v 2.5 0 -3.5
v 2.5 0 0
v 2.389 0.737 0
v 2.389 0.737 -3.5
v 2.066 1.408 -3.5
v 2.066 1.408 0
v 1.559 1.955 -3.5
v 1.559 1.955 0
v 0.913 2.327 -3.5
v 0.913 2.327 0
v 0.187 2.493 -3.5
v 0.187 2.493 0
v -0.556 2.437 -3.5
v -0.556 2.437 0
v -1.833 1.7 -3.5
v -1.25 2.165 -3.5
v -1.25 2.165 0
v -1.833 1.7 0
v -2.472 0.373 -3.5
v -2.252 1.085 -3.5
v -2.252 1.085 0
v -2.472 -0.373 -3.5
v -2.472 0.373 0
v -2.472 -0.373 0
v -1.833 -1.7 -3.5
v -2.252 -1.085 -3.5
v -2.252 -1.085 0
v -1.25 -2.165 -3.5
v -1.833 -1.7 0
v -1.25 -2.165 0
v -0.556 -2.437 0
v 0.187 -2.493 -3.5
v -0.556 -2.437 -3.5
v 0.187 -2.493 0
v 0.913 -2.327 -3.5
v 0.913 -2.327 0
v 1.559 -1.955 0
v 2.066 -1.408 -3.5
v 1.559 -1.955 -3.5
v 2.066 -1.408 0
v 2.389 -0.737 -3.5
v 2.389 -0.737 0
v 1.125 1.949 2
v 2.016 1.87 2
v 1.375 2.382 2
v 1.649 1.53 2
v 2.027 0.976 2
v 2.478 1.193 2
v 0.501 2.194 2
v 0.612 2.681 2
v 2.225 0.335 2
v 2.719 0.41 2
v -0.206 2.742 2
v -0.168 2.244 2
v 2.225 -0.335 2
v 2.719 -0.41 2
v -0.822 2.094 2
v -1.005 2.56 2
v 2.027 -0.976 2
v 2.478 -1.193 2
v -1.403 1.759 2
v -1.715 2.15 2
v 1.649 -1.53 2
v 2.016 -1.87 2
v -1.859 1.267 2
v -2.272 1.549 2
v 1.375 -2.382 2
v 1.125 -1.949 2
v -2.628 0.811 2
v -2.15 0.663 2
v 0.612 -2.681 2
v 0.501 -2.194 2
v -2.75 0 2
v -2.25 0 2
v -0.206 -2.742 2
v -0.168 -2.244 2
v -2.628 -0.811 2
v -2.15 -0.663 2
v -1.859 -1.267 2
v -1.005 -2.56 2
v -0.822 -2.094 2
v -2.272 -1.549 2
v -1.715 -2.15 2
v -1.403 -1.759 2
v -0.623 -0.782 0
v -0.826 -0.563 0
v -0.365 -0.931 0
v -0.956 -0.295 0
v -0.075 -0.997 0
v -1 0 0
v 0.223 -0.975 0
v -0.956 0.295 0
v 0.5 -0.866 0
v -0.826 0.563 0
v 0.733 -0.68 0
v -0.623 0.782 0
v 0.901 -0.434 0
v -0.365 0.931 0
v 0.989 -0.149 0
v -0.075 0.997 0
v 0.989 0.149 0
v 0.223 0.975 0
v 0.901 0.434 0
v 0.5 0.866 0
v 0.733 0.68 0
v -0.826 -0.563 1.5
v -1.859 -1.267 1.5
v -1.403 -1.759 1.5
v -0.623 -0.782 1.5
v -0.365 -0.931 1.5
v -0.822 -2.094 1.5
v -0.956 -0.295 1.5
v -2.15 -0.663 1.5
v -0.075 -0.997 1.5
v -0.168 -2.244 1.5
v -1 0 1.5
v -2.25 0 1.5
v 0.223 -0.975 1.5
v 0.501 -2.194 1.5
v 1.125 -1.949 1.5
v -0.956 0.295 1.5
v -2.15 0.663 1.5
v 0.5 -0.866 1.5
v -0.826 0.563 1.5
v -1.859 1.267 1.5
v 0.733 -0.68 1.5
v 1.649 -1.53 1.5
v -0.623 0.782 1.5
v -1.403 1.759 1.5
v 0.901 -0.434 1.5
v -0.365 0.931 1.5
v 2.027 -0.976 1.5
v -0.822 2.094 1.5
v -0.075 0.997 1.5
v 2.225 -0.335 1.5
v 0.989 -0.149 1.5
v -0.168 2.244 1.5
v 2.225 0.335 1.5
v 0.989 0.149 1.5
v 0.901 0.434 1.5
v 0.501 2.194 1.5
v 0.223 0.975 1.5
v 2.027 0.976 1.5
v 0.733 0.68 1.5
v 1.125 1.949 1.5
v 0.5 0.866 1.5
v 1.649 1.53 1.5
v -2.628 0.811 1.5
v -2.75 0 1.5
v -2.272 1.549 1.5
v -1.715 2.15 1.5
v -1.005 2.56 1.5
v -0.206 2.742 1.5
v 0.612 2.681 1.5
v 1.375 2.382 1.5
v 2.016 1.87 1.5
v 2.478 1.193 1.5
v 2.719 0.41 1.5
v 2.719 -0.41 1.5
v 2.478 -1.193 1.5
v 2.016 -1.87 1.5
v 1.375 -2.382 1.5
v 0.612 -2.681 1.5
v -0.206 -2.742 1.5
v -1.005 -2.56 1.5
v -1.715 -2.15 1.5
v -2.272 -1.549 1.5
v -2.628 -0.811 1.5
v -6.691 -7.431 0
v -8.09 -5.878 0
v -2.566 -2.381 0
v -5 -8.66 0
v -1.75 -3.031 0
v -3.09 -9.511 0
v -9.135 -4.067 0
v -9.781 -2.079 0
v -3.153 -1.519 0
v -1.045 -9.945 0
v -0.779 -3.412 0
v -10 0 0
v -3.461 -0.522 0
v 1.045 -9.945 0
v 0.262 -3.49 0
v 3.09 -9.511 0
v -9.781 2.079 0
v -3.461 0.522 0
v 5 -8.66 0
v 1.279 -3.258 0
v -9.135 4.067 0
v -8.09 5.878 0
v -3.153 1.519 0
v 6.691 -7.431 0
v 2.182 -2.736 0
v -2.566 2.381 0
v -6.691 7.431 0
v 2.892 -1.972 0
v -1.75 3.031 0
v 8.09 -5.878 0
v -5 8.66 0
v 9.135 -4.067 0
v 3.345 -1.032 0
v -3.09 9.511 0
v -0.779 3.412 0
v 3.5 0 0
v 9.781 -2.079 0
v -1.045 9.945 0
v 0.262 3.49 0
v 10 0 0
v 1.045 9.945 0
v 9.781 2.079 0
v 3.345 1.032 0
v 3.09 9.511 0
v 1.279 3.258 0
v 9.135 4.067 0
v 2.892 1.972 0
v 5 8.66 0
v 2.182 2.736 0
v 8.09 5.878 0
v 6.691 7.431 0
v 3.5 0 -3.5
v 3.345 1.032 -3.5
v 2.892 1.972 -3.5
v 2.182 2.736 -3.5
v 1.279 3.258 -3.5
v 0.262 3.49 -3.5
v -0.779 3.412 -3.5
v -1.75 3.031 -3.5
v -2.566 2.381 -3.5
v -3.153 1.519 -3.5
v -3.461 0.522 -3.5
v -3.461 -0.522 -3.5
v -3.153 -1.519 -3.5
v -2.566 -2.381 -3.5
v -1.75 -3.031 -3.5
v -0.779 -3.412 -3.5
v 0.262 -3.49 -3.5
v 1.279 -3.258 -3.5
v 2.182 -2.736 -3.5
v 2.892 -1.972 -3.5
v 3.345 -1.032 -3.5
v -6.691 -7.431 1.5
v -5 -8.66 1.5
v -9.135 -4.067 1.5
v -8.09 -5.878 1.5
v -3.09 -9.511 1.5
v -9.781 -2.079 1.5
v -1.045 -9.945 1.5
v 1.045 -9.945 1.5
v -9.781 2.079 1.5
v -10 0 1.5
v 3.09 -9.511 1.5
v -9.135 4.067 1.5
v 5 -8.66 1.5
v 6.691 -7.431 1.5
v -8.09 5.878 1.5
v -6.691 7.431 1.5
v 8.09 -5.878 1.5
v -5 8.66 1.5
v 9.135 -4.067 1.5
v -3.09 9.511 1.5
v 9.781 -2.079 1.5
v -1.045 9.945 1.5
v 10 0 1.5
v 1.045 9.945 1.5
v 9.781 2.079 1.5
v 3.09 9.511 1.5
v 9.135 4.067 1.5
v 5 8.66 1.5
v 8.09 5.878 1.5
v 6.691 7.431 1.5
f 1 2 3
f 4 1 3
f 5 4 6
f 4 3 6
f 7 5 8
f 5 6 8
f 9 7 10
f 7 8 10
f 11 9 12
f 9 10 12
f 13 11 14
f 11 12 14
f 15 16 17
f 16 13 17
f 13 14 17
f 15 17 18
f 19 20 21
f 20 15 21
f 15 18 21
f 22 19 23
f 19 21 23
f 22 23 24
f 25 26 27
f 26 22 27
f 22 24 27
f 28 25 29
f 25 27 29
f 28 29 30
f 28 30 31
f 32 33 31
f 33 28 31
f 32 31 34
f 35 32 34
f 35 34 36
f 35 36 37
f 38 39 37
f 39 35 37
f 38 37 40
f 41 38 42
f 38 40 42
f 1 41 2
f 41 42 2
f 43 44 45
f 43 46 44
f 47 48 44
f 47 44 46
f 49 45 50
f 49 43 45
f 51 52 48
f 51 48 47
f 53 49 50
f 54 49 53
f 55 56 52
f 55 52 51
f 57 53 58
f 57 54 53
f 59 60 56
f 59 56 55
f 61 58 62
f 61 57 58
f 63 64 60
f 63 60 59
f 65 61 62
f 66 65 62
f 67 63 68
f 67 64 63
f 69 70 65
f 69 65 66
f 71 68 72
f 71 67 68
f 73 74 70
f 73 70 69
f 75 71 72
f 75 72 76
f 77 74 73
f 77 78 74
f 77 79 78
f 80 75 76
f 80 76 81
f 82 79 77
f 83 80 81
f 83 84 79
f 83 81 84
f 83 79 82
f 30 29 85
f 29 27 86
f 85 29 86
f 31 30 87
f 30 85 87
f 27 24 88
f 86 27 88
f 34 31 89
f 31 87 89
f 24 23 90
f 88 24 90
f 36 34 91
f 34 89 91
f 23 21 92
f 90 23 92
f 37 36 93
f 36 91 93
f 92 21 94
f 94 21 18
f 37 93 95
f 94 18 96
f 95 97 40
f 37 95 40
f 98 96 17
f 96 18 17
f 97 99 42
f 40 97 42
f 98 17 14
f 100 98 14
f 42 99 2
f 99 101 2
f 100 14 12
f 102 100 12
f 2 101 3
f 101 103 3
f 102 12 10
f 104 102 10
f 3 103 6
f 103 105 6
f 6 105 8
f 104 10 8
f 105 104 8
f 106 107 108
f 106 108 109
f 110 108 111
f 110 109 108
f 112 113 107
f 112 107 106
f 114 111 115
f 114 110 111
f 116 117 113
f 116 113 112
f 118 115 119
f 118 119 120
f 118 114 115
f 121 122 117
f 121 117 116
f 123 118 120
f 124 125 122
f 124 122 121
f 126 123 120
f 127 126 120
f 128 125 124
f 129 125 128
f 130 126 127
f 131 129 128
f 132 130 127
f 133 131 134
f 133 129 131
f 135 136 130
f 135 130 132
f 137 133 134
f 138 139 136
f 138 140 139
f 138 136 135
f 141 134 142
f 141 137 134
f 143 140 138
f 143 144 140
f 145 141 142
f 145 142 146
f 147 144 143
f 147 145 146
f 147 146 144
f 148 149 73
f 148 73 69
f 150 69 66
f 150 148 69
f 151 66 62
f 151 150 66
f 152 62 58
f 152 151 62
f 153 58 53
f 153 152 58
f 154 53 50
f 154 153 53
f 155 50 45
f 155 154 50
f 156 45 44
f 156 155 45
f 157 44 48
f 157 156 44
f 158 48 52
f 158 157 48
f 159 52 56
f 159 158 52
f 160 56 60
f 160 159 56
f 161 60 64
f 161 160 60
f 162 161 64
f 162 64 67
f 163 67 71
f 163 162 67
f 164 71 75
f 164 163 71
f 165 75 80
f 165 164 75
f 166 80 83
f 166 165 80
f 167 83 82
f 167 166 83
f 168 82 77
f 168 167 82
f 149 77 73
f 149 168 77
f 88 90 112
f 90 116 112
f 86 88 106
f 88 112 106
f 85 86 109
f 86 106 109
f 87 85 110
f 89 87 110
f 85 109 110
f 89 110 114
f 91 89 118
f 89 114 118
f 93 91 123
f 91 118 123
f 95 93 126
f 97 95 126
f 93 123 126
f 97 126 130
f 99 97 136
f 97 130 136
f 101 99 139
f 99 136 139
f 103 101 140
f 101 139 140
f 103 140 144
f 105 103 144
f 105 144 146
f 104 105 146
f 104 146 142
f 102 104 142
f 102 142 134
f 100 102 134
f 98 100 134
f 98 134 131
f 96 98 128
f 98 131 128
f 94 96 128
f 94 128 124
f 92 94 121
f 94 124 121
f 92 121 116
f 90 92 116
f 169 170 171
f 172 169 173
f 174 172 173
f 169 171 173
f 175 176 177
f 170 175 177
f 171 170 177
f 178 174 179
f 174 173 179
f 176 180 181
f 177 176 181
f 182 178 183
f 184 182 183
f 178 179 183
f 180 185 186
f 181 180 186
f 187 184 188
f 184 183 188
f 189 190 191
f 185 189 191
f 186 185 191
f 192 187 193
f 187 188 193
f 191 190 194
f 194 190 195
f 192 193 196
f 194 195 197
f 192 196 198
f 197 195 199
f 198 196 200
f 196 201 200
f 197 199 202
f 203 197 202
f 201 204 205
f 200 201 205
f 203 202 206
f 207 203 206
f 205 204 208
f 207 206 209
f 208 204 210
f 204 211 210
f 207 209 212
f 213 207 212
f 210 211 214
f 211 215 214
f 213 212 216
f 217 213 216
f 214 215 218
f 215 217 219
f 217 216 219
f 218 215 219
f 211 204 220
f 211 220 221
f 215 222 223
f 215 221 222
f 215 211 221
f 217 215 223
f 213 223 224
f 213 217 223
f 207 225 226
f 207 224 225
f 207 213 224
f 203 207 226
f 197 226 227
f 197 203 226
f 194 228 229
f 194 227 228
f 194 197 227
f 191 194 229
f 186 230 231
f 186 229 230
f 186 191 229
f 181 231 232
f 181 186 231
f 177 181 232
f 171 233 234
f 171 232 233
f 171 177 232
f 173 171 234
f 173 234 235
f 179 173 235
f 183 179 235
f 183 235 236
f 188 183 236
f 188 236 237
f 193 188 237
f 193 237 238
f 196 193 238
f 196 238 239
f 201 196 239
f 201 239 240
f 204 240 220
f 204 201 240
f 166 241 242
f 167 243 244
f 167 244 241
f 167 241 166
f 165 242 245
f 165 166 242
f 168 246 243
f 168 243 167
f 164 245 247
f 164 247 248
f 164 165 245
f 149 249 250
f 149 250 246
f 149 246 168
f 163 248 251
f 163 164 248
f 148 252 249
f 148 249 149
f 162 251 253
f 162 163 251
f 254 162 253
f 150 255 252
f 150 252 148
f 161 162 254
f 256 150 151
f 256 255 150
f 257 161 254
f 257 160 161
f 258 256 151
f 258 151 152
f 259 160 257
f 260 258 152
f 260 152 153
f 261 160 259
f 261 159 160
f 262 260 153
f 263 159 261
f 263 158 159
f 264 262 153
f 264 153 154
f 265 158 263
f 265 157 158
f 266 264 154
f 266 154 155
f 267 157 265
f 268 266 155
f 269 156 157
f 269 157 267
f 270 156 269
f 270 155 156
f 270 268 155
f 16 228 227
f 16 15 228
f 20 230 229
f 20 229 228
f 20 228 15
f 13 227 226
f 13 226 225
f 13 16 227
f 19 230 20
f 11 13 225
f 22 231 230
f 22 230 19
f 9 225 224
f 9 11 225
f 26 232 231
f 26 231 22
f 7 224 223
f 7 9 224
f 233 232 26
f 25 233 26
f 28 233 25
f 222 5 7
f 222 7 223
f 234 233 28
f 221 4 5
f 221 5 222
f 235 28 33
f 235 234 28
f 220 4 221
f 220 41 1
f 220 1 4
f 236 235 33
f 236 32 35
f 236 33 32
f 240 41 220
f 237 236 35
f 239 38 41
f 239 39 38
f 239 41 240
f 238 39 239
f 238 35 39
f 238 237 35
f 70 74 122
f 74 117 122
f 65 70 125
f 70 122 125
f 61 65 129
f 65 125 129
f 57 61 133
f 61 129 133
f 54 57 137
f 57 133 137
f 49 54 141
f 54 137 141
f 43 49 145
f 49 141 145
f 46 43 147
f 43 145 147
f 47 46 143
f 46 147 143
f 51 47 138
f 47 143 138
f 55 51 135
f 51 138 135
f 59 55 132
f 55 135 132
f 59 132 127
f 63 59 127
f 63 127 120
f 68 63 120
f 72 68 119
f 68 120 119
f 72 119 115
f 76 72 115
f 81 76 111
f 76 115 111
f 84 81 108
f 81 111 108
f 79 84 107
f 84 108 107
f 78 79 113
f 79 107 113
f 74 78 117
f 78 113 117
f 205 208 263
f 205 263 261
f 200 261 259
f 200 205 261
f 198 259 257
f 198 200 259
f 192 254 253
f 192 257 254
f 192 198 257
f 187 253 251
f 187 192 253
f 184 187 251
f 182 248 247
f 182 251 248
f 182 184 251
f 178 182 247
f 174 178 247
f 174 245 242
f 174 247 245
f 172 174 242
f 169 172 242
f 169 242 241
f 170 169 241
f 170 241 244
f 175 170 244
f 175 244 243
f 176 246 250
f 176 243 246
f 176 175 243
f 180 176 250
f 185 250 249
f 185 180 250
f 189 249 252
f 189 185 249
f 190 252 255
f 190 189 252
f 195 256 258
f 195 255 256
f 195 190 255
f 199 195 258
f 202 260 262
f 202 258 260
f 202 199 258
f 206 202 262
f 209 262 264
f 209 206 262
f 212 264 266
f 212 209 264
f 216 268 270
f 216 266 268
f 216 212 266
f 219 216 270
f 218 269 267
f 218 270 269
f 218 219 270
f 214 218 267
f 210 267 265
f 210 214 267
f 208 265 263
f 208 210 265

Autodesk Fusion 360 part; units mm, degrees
sketch "Horn Body" plane through (0, 0, 0) normal (0, 0, 1) x (1, 0, 0)
  circle A0 centre (0, 0) radius 10
  dimension "d1" = 20
extrude "Extrude1" add sketch "Horn Body" along normal blind 1.5
sketch "Connector" plane through (0, 0, 0) normal (0, 0, -1) x (1, 0, 0)
  circle A0 centre (0, 0) radius 10
  circle A1 centre (0, 0) radius 2.5
  circle A2 centre (0, 0) radius 3.5
  dimension "d4" = 5
  dimension "d5" = 7
extrude "Extrude2" add sketch "Connector" along normal blind 3.5 contours A2
sketch "Screw Hole" plane through (0, 0, 1.5) normal (0, 0, 1) x (-1, 0, 0)
  circle A0 centre (0, 0) radius 10
  circle A1 centre (0, 0) radius 2.75
  circle A2 centre (0, 0) radius 2.25
  circle A3 centre (0, 0) radius 1
  dimension "d8" = 5.5
  dimension "d9" = 4.5
  dimension "d10" = 2
extrude "Extrude3" add sketch "Screw Hole" along normal blind 0.5 contours A1
extrude "Extrude4" cut sketch "Screw Hole" against normal blind 1.5 contours A3
